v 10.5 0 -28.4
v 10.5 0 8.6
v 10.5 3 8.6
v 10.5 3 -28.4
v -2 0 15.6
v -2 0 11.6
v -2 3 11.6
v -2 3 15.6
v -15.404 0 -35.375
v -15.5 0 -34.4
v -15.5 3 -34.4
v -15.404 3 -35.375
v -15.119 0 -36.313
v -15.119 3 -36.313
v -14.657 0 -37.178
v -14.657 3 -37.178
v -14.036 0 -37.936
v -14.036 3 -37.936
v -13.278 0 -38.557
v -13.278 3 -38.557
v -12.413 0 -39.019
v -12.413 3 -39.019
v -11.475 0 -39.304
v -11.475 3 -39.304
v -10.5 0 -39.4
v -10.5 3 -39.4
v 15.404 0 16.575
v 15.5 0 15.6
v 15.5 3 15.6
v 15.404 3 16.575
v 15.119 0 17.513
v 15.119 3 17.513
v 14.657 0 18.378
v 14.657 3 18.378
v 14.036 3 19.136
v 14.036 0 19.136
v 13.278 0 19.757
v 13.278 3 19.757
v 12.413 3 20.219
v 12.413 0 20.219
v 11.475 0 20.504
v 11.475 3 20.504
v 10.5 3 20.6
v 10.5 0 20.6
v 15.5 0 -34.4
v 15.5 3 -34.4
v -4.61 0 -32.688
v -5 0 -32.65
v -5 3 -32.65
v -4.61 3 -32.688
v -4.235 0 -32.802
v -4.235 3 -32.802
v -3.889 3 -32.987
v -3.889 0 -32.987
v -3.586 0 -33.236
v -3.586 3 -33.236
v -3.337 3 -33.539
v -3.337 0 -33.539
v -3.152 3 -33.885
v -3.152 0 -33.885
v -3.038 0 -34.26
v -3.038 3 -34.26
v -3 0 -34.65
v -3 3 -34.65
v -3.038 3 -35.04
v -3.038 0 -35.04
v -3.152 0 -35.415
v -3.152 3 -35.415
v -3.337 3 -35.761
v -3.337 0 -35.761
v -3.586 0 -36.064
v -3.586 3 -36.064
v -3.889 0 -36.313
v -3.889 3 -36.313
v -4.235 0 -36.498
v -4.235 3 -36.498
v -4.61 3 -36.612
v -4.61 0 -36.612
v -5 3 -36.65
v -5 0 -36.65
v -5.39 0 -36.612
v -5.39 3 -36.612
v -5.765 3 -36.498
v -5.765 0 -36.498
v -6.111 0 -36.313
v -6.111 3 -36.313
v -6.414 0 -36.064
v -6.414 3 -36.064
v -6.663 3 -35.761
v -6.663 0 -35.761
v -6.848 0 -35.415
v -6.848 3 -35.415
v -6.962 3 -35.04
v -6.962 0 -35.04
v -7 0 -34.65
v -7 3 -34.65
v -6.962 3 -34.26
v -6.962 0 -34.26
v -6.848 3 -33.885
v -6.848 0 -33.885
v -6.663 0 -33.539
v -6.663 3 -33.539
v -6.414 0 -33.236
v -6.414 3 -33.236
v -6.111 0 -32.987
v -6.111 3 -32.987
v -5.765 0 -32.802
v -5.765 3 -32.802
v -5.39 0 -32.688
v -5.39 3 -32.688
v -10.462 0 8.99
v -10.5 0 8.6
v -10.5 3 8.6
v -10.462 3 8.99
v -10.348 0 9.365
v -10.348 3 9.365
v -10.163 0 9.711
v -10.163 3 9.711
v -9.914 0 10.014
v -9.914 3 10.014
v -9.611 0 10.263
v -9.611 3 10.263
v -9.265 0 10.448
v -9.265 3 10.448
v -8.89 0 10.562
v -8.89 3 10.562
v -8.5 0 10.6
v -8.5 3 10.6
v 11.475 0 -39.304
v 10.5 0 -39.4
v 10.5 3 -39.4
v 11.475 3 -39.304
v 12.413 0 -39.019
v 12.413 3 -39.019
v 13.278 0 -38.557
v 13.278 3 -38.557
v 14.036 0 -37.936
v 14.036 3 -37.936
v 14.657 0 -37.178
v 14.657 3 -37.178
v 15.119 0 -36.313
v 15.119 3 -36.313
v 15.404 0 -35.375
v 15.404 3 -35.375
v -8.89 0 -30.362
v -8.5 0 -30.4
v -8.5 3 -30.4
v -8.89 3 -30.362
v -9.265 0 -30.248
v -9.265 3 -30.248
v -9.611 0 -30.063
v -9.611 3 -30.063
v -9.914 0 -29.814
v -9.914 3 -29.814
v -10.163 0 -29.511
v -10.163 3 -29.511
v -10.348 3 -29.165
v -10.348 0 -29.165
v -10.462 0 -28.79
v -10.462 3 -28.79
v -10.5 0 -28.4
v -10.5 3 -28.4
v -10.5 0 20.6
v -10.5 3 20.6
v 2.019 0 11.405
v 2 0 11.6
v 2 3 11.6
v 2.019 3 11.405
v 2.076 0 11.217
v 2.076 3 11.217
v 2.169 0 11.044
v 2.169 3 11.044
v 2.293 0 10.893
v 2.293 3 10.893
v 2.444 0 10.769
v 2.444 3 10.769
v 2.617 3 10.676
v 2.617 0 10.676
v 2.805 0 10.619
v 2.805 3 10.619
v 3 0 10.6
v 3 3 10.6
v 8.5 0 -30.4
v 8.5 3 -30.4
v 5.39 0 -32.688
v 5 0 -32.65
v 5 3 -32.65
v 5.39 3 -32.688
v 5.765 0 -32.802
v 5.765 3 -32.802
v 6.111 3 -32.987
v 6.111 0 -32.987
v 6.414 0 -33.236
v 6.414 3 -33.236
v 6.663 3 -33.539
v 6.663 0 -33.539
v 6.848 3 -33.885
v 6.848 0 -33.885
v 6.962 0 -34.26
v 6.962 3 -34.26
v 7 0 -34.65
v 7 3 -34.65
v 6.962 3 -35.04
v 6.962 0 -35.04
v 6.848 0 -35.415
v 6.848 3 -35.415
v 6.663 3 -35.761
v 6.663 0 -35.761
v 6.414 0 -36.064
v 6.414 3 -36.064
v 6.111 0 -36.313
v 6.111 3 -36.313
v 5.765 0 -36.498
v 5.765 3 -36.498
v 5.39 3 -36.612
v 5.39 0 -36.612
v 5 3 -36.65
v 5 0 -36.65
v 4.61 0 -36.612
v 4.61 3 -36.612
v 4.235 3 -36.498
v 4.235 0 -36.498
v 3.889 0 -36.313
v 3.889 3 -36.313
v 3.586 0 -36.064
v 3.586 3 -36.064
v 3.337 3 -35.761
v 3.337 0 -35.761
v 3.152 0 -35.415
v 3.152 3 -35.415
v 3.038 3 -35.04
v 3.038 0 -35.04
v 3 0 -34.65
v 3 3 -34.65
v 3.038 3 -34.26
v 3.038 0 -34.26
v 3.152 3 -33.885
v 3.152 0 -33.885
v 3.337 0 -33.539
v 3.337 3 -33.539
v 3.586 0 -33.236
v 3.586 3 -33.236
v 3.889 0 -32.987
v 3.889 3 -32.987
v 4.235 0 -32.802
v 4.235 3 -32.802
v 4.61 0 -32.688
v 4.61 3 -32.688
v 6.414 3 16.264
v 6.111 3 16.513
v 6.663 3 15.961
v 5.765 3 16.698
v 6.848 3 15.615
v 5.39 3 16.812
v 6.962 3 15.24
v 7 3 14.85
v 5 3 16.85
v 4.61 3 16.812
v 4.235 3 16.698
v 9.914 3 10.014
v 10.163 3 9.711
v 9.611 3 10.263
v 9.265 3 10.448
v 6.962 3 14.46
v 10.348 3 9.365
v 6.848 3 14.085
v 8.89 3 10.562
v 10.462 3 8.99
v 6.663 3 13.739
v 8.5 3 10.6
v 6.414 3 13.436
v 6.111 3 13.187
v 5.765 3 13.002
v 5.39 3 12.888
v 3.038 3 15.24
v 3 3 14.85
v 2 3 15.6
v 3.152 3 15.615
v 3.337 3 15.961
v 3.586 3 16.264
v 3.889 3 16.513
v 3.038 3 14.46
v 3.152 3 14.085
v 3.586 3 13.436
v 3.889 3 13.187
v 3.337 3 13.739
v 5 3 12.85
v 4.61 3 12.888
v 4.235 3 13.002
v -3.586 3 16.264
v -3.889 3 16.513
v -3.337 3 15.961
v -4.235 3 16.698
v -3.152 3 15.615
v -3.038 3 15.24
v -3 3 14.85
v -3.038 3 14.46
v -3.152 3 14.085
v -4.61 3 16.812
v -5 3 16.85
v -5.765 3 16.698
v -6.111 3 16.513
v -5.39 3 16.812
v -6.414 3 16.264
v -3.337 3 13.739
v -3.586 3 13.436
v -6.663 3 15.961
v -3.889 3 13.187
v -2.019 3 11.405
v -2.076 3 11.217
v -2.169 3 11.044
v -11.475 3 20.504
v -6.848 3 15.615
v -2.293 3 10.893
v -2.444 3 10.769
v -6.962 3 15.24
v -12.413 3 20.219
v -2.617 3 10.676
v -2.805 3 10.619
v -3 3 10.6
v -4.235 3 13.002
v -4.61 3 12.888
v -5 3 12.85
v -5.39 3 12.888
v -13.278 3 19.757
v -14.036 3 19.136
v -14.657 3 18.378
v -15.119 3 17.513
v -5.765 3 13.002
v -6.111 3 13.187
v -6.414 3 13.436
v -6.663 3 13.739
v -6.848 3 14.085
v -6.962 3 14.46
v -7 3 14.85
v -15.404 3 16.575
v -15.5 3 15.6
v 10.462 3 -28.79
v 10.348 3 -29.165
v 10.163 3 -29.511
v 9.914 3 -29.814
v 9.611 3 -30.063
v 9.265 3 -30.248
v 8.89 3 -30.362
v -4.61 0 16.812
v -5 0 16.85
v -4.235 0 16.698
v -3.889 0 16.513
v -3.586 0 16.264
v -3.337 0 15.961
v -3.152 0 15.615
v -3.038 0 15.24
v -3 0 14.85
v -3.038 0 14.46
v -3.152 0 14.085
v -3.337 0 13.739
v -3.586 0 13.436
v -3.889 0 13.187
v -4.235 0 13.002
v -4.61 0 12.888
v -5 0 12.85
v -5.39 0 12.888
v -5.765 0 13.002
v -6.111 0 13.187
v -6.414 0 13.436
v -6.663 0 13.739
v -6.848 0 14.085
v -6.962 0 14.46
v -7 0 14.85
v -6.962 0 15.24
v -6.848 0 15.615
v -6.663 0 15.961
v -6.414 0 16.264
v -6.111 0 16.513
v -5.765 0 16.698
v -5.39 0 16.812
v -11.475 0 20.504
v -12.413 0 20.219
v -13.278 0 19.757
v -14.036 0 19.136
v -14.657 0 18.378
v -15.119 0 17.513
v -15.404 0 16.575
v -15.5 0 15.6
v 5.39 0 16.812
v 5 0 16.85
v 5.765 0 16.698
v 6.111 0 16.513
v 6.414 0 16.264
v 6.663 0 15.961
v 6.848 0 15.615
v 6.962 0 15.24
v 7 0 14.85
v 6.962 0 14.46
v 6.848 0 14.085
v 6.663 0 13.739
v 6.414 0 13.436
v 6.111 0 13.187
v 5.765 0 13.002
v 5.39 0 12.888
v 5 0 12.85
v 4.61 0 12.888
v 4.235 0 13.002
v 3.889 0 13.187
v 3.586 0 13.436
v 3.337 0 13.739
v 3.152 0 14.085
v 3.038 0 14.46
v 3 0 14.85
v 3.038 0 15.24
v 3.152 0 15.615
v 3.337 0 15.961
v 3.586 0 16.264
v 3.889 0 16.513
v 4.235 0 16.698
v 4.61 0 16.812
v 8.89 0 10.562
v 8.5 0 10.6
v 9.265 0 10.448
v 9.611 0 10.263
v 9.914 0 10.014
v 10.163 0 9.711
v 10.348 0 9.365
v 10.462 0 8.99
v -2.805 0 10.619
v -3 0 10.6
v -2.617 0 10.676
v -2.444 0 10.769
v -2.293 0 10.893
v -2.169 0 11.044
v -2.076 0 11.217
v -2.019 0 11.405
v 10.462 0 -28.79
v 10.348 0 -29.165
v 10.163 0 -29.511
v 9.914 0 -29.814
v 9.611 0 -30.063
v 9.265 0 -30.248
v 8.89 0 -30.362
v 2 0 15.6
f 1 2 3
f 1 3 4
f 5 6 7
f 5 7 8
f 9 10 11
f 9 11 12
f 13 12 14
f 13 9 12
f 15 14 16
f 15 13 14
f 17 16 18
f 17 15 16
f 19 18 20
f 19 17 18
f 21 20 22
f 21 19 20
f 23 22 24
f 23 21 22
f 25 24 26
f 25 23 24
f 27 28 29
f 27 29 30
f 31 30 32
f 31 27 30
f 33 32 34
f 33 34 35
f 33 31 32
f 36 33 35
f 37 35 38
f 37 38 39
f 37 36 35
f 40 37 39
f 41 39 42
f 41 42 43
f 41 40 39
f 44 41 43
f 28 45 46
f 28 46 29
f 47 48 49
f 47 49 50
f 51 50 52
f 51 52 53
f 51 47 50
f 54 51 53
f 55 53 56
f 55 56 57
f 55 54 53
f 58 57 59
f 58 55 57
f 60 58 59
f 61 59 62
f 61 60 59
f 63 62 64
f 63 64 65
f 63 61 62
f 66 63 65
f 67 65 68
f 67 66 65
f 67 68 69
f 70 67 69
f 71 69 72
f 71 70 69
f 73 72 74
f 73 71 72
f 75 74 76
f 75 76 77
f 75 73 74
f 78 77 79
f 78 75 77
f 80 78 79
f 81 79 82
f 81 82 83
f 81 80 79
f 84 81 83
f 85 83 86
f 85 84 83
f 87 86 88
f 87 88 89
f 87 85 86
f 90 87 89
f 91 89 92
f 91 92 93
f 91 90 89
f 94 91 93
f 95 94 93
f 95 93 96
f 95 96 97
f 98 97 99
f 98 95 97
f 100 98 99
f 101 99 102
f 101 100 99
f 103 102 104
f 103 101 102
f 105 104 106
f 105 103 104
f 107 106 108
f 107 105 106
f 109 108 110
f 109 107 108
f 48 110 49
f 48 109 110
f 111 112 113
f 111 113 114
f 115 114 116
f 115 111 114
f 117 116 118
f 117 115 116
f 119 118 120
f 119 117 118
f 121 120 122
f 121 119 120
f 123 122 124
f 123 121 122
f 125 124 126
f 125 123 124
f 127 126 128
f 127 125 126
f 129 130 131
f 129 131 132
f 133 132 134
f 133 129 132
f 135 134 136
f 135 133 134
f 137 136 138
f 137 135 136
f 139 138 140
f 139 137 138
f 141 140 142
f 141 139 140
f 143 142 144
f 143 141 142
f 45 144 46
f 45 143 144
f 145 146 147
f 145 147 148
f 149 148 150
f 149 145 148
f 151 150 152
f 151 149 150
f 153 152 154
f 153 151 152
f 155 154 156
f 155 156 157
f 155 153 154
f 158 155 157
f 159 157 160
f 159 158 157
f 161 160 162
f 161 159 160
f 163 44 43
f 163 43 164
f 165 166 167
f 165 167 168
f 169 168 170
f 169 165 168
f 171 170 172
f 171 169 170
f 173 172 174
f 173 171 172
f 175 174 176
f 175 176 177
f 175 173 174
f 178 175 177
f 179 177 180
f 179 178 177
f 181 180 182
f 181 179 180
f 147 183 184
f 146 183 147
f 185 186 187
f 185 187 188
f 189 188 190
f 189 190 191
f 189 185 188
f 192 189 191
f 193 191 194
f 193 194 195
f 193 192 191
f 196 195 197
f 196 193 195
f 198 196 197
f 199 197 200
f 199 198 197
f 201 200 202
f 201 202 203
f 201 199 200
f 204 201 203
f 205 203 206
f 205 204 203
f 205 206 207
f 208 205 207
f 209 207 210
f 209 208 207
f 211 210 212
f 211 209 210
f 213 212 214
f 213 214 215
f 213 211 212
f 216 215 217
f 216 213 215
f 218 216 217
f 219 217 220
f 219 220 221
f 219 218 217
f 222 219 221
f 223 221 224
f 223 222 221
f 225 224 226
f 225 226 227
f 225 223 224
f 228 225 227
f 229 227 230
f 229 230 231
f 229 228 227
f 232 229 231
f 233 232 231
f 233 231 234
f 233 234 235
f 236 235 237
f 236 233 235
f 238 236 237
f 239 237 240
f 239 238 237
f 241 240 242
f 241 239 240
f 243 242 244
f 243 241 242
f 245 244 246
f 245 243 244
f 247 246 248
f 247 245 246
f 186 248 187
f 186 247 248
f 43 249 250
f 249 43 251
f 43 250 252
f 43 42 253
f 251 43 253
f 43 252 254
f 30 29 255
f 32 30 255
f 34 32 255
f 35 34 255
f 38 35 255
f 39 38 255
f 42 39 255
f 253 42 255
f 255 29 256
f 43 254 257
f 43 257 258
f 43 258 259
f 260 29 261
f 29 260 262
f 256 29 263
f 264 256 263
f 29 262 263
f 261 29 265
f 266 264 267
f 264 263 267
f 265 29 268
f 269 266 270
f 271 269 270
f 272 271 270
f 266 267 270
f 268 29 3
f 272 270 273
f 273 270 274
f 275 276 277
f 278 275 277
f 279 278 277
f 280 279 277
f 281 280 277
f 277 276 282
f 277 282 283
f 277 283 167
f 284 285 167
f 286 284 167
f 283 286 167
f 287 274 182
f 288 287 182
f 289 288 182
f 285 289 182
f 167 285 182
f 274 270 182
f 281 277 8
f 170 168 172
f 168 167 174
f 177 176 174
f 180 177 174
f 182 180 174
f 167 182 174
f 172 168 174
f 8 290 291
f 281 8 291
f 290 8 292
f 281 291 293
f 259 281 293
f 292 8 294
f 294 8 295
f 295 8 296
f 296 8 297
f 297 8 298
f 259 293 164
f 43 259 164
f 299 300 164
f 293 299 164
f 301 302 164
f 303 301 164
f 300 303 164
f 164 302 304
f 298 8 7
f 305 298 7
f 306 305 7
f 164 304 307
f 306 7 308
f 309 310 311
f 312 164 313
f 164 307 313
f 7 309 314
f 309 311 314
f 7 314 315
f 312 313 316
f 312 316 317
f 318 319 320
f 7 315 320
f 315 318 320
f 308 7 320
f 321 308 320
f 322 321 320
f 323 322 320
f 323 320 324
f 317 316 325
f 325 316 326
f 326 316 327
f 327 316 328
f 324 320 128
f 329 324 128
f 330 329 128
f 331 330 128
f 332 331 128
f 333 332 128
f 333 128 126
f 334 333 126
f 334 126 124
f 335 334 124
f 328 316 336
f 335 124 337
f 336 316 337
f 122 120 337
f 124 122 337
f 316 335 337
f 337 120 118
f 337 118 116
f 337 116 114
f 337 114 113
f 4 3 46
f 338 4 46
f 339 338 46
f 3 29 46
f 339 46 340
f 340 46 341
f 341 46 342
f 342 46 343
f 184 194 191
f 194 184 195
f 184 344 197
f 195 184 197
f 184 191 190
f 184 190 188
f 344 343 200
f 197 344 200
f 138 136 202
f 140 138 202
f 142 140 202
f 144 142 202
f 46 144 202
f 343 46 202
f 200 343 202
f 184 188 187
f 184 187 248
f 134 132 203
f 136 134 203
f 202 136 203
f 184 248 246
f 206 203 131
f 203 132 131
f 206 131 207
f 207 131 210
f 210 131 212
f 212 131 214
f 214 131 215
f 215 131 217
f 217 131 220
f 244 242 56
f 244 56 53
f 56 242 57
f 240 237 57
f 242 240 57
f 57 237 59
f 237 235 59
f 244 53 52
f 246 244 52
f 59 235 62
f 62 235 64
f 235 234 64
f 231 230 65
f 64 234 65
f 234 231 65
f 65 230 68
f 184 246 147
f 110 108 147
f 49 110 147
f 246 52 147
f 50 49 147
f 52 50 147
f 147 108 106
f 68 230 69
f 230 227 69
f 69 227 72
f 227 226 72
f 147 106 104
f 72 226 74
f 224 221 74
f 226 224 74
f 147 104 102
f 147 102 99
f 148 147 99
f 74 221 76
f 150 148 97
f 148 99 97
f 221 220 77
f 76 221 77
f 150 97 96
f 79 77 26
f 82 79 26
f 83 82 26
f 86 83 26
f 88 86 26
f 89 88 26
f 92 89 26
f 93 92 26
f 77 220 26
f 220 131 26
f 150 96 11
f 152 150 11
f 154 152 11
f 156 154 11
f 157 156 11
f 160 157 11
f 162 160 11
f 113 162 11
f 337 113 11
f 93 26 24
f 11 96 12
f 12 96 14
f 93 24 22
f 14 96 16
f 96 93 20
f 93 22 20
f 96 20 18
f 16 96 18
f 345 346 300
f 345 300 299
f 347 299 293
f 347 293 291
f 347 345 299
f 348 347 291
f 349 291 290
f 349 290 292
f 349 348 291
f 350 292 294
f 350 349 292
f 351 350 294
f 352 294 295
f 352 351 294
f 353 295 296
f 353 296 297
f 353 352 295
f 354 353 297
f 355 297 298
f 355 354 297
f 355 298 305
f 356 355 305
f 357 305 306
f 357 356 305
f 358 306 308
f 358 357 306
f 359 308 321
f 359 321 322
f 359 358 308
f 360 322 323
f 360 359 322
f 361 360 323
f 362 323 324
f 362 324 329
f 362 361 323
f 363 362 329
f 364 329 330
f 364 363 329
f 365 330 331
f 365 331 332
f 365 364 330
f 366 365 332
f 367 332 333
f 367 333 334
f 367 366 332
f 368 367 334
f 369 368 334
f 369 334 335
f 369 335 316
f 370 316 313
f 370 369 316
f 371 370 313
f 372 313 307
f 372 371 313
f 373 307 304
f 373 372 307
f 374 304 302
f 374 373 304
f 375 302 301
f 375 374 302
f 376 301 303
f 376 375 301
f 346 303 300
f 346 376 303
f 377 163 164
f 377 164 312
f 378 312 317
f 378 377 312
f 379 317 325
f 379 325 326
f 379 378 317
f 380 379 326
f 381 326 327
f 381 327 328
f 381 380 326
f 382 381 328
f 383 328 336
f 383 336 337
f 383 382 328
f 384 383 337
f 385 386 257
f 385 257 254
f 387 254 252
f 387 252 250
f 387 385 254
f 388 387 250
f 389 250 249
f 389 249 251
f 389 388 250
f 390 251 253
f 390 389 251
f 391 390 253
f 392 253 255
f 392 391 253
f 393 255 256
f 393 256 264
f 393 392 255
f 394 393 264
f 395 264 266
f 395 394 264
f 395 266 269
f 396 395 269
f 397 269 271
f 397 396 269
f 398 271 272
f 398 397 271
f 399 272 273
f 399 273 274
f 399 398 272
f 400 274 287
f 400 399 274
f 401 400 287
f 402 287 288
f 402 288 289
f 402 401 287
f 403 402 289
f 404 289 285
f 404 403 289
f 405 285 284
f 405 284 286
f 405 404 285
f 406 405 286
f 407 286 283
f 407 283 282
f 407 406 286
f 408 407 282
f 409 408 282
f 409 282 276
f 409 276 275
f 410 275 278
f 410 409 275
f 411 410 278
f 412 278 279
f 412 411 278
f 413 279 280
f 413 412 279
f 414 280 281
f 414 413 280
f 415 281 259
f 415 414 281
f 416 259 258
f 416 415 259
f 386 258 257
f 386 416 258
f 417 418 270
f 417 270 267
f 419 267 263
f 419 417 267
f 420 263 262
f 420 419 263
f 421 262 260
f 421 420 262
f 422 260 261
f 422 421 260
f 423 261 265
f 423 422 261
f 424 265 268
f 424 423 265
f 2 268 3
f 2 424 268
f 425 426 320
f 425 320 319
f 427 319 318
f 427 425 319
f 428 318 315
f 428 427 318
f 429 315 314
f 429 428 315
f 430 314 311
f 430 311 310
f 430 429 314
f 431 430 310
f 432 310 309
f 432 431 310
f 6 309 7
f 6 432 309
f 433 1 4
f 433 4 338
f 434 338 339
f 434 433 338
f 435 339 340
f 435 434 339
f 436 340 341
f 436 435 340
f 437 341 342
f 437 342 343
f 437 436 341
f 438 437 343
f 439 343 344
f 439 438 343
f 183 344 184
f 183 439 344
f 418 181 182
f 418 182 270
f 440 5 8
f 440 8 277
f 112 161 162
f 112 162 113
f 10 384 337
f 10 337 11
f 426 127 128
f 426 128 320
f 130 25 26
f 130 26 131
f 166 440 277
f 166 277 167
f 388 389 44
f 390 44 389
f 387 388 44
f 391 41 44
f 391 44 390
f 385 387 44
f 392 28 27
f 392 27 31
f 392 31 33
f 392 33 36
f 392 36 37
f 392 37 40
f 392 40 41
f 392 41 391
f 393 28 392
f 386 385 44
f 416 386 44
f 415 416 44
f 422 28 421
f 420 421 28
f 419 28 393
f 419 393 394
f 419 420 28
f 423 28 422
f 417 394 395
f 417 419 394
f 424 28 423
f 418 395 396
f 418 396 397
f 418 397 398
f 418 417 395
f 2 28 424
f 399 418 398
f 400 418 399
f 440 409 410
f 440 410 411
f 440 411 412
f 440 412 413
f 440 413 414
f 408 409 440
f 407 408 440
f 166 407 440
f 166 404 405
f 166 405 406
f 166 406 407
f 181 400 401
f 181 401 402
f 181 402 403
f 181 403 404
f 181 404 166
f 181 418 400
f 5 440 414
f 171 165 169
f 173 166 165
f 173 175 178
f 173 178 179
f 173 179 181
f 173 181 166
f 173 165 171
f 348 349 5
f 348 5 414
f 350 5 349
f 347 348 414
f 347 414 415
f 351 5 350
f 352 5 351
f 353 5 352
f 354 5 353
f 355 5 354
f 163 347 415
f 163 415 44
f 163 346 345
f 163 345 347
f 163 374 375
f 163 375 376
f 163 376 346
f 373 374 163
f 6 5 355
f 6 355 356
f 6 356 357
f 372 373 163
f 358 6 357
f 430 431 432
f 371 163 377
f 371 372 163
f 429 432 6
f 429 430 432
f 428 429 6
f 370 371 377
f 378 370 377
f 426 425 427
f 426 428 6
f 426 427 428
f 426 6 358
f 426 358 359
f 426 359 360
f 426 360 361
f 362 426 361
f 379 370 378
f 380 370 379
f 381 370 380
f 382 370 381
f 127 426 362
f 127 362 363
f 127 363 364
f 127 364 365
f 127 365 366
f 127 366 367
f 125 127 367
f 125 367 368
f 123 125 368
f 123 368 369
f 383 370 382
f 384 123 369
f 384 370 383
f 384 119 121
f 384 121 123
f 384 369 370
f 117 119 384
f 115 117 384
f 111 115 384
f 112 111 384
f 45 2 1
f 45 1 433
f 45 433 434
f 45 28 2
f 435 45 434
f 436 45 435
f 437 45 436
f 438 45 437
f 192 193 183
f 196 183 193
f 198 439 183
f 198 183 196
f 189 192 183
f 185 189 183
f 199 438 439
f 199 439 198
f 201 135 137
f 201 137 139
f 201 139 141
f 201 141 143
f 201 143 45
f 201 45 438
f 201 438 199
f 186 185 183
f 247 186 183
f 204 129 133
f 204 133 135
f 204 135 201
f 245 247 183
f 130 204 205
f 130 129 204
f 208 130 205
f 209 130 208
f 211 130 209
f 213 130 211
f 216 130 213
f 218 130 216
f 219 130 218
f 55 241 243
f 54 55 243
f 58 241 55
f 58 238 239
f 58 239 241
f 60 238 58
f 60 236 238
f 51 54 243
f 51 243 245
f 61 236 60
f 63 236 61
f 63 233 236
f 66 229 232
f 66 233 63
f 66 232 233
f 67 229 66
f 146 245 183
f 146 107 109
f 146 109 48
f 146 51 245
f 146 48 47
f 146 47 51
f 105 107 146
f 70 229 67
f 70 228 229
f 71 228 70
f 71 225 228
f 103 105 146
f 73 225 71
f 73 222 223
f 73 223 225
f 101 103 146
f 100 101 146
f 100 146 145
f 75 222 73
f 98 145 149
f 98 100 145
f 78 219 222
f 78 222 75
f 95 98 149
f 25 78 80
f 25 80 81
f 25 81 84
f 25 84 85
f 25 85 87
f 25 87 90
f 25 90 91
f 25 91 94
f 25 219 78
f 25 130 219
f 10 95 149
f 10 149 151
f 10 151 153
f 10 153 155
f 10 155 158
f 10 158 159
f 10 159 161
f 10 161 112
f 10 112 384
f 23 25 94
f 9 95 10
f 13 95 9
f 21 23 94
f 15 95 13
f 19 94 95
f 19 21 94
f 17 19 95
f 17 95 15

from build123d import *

# Parameters (mm, degrees)
SKETCH1_R           = 2
BOSS_EXTRUDE1_DEPTH = 3


with BuildPart() as part:
    # Sketch1 → Boss-Extrude1 (new body)
    with BuildSketch(Plane(origin=(0, 0, 0), x_dir=(1, 0, 0), z_dir=(0, 1, 0))):
        with BuildLine():
            ThreePointArc((-15.5, 34.4), (-14.035533906, 37.935533906), (-10.5, 39.4))
            Line((-10.5, 39.4), (10.5, 39.4))
            ThreePointArc((10.5, 39.4), (14.035533906, 37.935533906), (15.5, 34.4))
            Line((15.5, 34.4), (15.5, -15.6))
            ThreePointArc((15.5, -15.6), (14.035533906, -19.135533906), (10.5, -20.6))
            Line((10.5, -20.6), (-10.5, -20.6))
            ThreePointArc((-10.5, -20.6), (-14.035533906, -19.135533906), (-15.5, -15.6))
            Line((-15.5, -15.6), (-15.5, 34.4))
        make_face()
        with Locations(Location((5, -14.85, 0), (0, 0, 270))):
            Circle(SKETCH1_R, mode=Mode.SUBTRACT)
        with Locations(Location((-5, -14.85, 0), (0, 0, 270))):
            Circle(SKETCH1_R, mode=Mode.SUBTRACT)
        with Locations(Location((5, 34.65, 0), (0, 0, 270))):
            Circle(SKETCH1_R, mode=Mode.SUBTRACT)
        with Locations(Location((-5, 34.65, 0), (0, 0, 270))):
            Circle(SKETCH1_R, mode=Mode.SUBTRACT)
        with BuildLine():
            ThreePointArc((-3, -10.6), (-2.292893219, -10.892893219), (-2, -11.6))
            Line((-2, -11.6), (-2, -15.6))
            Line((-2, -15.6), (2, -15.6))
            Line((2, -15.6), (2, -11.6))
            ThreePointArc((2, -11.6), (2.292893219, -10.892893219), (3, -10.6))
            Line((3, -10.6), (8.5, -10.6))
            ThreePointArc((8.5, -10.6), (9.914213562, -10.014213562), (10.5, -8.6))
            Line((10.5, -8.6), (10.5, 28.4))
            ThreePointArc((10.5, 28.4), (9.914213562, 29.814213562), (8.5, 30.4))
            Line((8.5, 30.4), (-8.5, 30.4))
            ThreePointArc((-8.5, 30.4), (-9.914213562, 29.814213562), (-10.5, 28.4))
            Line((-10.5, 28.4), (-10.5, -8.6))
            ThreePointArc((-10.5, -8.6), (-9.914213562, -10.014213562), (-8.5, -10.6))
            Line((-8.5, -10.6), (-3, -10.6))
        make_face(mode=Mode.SUBTRACT)
    extrude(amount=BOSS_EXTRUDE1_DEPTH)


solid = part.part
